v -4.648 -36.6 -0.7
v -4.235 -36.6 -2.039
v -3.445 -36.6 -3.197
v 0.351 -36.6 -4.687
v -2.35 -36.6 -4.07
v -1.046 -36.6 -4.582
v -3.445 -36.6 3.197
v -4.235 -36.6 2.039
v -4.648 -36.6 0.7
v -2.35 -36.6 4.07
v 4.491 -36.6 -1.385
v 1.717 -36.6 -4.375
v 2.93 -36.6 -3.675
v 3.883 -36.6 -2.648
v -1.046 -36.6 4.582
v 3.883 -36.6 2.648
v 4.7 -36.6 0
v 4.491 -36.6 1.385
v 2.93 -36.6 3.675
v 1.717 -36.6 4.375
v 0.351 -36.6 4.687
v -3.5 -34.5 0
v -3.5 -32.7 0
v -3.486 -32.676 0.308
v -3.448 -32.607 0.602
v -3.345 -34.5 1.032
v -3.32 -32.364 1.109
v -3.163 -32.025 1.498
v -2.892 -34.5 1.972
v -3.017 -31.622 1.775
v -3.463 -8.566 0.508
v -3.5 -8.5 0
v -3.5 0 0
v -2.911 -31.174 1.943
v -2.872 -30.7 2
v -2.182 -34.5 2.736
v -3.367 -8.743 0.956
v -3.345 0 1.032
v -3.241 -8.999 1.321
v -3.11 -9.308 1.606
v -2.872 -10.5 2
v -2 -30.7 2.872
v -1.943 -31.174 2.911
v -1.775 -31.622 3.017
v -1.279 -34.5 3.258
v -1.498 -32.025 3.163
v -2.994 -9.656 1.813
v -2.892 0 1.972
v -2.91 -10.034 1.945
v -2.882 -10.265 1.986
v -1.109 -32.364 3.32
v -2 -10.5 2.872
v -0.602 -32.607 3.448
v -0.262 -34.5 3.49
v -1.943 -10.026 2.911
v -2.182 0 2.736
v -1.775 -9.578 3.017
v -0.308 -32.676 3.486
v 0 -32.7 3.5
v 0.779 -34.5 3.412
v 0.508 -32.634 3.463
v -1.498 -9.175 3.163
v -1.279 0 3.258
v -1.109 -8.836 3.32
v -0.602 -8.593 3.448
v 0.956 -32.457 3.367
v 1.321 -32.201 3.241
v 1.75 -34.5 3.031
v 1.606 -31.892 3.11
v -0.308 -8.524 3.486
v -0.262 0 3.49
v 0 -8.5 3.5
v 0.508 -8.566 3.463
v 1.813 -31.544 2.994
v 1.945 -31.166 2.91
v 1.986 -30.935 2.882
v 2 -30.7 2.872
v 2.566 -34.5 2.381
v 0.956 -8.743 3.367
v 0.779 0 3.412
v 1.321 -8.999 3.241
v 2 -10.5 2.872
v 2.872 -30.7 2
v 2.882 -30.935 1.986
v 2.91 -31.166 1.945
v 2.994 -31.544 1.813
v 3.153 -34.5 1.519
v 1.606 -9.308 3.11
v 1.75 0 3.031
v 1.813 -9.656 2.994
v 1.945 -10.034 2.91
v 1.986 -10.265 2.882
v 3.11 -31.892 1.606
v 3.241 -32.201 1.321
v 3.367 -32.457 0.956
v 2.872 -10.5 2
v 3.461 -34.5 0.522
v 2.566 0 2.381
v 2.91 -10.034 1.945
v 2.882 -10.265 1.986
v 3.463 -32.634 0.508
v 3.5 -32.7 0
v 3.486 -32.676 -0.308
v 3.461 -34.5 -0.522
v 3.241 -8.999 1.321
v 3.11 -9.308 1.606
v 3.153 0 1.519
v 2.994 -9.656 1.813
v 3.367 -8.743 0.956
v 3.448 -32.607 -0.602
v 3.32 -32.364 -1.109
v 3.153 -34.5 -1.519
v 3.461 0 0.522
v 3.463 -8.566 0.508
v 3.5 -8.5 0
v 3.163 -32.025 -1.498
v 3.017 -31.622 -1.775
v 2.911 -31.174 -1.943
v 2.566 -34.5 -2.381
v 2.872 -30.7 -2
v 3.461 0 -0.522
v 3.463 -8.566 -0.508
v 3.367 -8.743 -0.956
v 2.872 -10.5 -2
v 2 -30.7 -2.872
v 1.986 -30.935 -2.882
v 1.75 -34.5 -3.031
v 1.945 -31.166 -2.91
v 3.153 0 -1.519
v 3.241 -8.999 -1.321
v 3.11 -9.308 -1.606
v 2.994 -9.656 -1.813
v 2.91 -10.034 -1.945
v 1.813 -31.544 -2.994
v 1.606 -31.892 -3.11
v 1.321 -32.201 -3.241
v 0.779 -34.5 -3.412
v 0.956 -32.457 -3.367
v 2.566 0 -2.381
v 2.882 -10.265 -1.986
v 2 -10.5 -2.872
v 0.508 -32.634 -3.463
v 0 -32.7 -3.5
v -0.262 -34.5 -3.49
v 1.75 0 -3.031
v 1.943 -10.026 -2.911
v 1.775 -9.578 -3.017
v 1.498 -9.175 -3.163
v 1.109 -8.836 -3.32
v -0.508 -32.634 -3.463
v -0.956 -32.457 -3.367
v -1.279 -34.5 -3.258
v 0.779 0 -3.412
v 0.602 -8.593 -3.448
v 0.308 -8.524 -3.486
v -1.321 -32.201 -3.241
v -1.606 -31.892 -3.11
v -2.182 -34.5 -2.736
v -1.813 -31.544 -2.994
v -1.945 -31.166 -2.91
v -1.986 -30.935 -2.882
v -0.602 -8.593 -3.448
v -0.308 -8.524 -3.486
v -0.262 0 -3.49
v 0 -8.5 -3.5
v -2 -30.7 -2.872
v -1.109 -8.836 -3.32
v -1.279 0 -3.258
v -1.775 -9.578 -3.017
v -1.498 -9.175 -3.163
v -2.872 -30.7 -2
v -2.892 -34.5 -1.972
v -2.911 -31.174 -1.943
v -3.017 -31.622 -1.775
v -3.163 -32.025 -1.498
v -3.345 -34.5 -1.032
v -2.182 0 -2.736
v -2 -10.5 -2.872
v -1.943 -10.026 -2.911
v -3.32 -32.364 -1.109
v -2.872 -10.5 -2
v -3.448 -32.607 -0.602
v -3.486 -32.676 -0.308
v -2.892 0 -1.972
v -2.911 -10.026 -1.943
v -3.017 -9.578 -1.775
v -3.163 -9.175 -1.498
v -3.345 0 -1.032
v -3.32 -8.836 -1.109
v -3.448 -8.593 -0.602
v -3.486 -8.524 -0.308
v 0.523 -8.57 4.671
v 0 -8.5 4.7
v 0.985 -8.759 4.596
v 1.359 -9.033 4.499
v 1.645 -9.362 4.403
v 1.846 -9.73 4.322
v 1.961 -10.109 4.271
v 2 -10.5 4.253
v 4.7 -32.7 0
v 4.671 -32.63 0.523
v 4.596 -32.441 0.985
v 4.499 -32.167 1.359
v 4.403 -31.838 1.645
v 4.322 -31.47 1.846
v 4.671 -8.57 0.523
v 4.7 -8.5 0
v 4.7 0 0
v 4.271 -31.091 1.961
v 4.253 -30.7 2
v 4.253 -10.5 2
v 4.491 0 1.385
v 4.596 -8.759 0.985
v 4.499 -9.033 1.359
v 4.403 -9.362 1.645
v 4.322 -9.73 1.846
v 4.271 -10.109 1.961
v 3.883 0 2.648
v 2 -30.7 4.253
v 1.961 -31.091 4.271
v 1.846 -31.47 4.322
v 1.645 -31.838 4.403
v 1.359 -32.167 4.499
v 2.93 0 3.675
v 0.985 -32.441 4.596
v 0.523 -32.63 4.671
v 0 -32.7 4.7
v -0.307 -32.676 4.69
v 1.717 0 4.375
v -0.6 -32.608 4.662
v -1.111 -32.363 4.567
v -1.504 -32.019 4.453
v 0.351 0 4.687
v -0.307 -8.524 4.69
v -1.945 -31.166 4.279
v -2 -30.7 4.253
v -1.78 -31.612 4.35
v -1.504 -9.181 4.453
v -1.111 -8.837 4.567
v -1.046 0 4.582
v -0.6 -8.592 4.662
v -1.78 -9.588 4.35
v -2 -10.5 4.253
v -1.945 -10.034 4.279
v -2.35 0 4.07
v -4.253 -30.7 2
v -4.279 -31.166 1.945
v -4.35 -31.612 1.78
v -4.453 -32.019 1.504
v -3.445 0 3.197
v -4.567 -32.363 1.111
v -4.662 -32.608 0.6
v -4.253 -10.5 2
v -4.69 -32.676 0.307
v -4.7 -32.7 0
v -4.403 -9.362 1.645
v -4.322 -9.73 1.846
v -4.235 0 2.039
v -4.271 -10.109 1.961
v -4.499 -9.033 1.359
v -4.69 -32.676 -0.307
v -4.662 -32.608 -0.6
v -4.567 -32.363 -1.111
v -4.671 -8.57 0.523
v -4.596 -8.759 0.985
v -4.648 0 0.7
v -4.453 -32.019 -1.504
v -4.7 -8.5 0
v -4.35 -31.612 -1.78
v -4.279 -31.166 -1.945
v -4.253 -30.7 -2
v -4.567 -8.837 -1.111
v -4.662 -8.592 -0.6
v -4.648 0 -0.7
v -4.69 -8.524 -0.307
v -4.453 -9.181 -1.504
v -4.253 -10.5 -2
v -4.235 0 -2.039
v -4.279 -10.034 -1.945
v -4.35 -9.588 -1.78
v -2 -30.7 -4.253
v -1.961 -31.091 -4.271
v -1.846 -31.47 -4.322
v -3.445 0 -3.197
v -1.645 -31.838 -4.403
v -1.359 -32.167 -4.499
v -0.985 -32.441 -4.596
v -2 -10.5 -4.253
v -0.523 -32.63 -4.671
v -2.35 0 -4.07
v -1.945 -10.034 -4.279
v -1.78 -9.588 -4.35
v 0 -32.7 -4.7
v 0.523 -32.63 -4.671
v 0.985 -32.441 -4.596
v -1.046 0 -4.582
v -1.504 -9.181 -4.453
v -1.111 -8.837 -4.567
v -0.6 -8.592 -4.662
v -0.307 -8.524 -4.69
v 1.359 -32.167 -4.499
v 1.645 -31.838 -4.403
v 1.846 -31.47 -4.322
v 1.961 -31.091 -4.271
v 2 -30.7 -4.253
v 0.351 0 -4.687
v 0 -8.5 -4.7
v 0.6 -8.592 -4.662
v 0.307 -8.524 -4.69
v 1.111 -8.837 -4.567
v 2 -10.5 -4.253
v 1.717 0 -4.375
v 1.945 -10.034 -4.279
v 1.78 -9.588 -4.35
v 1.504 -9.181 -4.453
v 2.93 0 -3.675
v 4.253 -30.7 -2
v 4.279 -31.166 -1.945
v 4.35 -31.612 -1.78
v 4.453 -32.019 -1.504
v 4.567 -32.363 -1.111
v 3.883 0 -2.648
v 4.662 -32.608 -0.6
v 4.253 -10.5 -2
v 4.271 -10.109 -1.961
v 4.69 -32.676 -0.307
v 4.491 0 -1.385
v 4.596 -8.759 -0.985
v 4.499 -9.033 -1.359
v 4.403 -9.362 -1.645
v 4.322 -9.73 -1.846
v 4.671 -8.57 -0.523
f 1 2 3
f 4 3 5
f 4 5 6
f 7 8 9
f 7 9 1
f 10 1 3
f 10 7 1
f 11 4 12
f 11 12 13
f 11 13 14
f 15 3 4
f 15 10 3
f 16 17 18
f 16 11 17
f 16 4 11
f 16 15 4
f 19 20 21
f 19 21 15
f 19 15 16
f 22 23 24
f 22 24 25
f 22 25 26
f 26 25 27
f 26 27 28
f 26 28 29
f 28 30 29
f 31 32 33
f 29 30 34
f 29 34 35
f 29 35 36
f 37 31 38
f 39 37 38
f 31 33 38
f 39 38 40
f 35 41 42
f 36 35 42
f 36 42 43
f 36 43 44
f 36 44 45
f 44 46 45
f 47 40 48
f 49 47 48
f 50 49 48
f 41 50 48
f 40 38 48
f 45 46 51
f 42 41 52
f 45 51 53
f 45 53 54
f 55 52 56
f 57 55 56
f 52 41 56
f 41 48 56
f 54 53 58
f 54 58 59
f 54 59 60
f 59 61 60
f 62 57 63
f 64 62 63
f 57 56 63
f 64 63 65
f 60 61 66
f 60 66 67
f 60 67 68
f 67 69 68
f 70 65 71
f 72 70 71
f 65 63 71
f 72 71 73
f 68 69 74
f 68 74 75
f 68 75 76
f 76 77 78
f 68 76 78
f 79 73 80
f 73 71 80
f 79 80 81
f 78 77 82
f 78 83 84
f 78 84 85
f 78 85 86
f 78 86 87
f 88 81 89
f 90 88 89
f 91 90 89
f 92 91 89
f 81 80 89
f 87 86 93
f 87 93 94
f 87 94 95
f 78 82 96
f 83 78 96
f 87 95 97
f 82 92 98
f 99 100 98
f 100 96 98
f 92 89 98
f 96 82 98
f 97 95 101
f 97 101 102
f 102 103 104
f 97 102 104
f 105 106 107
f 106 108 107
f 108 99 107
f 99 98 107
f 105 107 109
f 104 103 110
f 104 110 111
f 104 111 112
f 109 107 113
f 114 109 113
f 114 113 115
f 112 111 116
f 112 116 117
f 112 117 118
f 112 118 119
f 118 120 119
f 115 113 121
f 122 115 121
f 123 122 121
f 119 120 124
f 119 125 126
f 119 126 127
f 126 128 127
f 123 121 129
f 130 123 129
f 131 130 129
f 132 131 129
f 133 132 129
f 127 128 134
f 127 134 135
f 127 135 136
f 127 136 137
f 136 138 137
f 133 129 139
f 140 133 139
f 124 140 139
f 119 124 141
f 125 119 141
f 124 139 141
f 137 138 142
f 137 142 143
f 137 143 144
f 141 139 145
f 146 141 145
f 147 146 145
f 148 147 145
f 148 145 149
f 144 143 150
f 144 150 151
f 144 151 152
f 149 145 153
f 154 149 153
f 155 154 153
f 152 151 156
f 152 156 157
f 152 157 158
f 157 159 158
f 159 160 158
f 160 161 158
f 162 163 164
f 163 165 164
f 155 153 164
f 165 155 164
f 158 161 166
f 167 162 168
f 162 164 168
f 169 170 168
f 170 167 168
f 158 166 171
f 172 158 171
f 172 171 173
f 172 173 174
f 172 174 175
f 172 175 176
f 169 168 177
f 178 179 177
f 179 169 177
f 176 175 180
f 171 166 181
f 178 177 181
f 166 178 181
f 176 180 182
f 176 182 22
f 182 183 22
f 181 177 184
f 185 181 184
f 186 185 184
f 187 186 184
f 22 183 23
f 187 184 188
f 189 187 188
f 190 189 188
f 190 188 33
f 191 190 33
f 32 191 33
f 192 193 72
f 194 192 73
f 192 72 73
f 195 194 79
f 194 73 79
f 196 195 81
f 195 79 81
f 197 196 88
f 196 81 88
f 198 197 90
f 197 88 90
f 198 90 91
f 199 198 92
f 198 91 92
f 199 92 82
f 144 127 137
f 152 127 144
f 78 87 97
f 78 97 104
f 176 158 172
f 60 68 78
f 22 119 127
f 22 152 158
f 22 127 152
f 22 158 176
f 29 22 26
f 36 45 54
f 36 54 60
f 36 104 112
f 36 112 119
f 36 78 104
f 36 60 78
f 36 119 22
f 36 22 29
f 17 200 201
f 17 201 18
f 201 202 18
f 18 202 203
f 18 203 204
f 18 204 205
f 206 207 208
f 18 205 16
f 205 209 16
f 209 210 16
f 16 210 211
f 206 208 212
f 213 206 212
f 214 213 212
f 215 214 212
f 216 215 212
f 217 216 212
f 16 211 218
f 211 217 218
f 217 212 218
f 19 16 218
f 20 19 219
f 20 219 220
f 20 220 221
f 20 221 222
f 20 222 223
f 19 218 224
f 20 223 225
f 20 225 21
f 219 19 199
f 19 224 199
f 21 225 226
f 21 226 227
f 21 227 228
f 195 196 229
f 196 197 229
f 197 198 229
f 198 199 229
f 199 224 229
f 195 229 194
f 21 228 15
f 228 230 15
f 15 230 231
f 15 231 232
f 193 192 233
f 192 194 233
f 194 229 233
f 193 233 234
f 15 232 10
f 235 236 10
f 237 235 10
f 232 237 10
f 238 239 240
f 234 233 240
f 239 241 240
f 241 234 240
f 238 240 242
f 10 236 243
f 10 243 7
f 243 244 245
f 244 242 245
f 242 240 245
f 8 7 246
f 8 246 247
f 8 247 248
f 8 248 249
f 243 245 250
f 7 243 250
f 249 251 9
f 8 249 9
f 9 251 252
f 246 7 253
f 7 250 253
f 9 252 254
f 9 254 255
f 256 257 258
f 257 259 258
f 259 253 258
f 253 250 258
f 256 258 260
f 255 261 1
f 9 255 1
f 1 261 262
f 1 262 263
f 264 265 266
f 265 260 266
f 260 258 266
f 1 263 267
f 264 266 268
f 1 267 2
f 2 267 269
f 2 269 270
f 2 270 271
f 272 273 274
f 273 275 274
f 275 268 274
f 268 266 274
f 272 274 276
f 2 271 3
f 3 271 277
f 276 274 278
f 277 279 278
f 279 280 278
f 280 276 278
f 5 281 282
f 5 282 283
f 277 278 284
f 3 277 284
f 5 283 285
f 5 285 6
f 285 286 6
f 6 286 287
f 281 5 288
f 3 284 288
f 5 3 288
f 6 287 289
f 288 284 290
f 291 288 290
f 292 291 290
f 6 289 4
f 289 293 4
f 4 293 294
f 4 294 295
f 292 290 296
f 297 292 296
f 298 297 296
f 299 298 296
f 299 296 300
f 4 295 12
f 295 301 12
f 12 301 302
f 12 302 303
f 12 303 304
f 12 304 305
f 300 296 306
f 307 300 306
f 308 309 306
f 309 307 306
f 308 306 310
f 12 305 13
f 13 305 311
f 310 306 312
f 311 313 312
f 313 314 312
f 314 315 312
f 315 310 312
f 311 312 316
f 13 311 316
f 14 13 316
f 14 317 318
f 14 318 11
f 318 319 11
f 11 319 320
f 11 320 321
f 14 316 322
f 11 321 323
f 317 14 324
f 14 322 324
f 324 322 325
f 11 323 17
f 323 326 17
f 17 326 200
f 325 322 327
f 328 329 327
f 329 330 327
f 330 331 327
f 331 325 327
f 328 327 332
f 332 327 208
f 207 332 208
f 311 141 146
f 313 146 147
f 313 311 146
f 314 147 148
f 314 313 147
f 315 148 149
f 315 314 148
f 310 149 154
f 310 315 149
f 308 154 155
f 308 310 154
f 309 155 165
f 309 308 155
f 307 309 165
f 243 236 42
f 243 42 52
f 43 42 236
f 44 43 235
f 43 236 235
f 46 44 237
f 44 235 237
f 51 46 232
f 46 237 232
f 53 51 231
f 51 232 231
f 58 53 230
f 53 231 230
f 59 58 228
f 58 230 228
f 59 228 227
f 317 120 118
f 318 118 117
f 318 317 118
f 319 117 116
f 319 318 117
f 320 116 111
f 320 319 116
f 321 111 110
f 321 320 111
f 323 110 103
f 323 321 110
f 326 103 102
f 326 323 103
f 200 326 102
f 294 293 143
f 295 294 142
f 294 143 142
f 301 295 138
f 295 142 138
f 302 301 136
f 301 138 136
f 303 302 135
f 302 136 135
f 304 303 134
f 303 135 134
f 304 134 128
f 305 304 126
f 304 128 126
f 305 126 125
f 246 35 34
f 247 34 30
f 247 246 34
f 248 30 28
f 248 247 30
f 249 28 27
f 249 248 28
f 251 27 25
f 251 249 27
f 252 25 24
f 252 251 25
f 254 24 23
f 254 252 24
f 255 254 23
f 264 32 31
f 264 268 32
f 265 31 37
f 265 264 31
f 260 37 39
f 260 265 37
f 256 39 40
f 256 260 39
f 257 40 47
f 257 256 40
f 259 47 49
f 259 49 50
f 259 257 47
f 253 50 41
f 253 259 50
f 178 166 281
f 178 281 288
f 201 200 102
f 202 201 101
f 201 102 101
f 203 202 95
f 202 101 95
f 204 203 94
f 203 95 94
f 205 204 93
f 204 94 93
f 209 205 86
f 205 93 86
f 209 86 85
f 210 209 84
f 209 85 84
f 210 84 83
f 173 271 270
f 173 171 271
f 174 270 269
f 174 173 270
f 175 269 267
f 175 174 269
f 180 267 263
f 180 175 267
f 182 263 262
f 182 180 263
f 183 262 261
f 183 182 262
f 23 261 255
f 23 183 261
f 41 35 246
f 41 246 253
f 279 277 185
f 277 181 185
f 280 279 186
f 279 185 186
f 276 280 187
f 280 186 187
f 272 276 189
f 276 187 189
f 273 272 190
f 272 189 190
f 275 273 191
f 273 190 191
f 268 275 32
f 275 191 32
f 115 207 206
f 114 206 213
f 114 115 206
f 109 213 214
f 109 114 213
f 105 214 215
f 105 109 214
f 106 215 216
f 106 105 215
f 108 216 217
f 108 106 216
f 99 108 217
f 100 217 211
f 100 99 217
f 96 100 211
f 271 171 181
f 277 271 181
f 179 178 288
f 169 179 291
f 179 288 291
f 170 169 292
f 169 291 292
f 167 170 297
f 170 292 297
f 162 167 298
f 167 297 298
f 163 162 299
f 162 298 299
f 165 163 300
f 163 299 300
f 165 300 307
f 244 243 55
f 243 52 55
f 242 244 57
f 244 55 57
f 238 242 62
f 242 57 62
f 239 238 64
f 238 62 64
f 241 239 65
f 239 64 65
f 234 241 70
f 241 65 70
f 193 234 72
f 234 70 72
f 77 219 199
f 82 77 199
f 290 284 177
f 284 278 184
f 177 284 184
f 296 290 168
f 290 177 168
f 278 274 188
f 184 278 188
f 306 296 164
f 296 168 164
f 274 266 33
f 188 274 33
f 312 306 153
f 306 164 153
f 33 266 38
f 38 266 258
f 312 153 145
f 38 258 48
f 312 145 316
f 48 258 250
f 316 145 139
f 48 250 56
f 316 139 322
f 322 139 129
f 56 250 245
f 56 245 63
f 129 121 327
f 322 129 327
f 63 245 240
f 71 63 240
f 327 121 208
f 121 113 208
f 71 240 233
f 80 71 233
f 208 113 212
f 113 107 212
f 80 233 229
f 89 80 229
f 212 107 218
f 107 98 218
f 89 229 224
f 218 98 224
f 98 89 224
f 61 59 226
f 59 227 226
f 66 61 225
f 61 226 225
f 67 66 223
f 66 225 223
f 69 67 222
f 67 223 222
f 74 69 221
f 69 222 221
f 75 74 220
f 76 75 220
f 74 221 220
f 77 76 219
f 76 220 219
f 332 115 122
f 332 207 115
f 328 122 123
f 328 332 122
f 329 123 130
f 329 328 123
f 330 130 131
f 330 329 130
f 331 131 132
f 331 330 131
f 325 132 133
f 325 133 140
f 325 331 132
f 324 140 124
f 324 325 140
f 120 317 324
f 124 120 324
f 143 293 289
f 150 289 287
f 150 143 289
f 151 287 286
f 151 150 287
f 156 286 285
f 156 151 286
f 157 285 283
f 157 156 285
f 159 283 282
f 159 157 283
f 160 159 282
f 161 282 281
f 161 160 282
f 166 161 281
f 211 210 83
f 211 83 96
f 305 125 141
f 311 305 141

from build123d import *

# Parameters (mm, degrees)
F0_R     = 4.7
F1_DEPTH = 36.6
F2_R     = 3.5
F3_DEPTH = 34.5
F4_W     = 4
F4_H     = 24.2
F5_DEPTH = 12.5
F6_W     = 24.2
F6_H     = 4
F7_DEPTH = 12.5
F8_R     = 1.9999


# Not quite as in the source:
# - a fillet or chamfer is up to 0.001 mm smaller than in the source, because OpenCascade refuses the exact size


with BuildPart() as f1:
    # F0 (on Front) → F1 (new body)
    with BuildSketch(Plane.XZ):
        Circle(F0_R)
    extrude(amount=F1_DEPTH)

    # F2 (on face) → F3 (cut)
    with BuildSketch(Plane(origin=(0, 0, 0), x_dir=(-1, 0, 0), z_dir=(0, 1, 0))):
        Circle(F2_R)
    extrude(amount=-F3_DEPTH, mode=Mode.SUBTRACT)

    # F4 (on Top) → F5 (cut, symmetric)
    with BuildSketch(Plane.XY):
        with Locations((0, -20.6)):
            Rectangle(F4_W, F4_H)
    extrude(amount=F5_DEPTH, both=True, mode=Mode.SUBTRACT)

    # F6 (on Right) → F7 (cut, symmetric)
    with BuildSketch(Plane.YZ):
        with Locations((-20.6, 0)):
            Rectangle(F6_W, F6_H)
    extrude(amount=F7_DEPTH, both=True, mode=Mode.SUBTRACT)

    # F8 (radius 2 in the source; OpenCascade refuses exactly that, so slightly less here)
    f8_edges = [f1.edges().sort_by_distance(p)[0] for p in [
        (2, -8.5, 3.562758),
        (2, -8.5, -3.562758),
        (-2, -8.5, 3.562758),
        (-2, -8.5, -3.562758),
        (3.562758, -8.5, -2),
        (-3.562758, -8.5, -2),
        (3.562758, -8.5, 2),
        (-3.562758, -8.5, 2),
        (3.562758, -32.7, 2),
        (-3.562758, -32.7, 2),
        (3.562758, -32.7, -2),
        (-3.562758, -32.7, -2),
        (-2, -32.7, 3.562758),
        (-2, -32.7, -3.562758),
        (2, -32.7, 3.562758),
        (2, -32.7, -3.562758),
    ]]
    fillet(f8_edges, radius=F8_R)


solid = f1.part
